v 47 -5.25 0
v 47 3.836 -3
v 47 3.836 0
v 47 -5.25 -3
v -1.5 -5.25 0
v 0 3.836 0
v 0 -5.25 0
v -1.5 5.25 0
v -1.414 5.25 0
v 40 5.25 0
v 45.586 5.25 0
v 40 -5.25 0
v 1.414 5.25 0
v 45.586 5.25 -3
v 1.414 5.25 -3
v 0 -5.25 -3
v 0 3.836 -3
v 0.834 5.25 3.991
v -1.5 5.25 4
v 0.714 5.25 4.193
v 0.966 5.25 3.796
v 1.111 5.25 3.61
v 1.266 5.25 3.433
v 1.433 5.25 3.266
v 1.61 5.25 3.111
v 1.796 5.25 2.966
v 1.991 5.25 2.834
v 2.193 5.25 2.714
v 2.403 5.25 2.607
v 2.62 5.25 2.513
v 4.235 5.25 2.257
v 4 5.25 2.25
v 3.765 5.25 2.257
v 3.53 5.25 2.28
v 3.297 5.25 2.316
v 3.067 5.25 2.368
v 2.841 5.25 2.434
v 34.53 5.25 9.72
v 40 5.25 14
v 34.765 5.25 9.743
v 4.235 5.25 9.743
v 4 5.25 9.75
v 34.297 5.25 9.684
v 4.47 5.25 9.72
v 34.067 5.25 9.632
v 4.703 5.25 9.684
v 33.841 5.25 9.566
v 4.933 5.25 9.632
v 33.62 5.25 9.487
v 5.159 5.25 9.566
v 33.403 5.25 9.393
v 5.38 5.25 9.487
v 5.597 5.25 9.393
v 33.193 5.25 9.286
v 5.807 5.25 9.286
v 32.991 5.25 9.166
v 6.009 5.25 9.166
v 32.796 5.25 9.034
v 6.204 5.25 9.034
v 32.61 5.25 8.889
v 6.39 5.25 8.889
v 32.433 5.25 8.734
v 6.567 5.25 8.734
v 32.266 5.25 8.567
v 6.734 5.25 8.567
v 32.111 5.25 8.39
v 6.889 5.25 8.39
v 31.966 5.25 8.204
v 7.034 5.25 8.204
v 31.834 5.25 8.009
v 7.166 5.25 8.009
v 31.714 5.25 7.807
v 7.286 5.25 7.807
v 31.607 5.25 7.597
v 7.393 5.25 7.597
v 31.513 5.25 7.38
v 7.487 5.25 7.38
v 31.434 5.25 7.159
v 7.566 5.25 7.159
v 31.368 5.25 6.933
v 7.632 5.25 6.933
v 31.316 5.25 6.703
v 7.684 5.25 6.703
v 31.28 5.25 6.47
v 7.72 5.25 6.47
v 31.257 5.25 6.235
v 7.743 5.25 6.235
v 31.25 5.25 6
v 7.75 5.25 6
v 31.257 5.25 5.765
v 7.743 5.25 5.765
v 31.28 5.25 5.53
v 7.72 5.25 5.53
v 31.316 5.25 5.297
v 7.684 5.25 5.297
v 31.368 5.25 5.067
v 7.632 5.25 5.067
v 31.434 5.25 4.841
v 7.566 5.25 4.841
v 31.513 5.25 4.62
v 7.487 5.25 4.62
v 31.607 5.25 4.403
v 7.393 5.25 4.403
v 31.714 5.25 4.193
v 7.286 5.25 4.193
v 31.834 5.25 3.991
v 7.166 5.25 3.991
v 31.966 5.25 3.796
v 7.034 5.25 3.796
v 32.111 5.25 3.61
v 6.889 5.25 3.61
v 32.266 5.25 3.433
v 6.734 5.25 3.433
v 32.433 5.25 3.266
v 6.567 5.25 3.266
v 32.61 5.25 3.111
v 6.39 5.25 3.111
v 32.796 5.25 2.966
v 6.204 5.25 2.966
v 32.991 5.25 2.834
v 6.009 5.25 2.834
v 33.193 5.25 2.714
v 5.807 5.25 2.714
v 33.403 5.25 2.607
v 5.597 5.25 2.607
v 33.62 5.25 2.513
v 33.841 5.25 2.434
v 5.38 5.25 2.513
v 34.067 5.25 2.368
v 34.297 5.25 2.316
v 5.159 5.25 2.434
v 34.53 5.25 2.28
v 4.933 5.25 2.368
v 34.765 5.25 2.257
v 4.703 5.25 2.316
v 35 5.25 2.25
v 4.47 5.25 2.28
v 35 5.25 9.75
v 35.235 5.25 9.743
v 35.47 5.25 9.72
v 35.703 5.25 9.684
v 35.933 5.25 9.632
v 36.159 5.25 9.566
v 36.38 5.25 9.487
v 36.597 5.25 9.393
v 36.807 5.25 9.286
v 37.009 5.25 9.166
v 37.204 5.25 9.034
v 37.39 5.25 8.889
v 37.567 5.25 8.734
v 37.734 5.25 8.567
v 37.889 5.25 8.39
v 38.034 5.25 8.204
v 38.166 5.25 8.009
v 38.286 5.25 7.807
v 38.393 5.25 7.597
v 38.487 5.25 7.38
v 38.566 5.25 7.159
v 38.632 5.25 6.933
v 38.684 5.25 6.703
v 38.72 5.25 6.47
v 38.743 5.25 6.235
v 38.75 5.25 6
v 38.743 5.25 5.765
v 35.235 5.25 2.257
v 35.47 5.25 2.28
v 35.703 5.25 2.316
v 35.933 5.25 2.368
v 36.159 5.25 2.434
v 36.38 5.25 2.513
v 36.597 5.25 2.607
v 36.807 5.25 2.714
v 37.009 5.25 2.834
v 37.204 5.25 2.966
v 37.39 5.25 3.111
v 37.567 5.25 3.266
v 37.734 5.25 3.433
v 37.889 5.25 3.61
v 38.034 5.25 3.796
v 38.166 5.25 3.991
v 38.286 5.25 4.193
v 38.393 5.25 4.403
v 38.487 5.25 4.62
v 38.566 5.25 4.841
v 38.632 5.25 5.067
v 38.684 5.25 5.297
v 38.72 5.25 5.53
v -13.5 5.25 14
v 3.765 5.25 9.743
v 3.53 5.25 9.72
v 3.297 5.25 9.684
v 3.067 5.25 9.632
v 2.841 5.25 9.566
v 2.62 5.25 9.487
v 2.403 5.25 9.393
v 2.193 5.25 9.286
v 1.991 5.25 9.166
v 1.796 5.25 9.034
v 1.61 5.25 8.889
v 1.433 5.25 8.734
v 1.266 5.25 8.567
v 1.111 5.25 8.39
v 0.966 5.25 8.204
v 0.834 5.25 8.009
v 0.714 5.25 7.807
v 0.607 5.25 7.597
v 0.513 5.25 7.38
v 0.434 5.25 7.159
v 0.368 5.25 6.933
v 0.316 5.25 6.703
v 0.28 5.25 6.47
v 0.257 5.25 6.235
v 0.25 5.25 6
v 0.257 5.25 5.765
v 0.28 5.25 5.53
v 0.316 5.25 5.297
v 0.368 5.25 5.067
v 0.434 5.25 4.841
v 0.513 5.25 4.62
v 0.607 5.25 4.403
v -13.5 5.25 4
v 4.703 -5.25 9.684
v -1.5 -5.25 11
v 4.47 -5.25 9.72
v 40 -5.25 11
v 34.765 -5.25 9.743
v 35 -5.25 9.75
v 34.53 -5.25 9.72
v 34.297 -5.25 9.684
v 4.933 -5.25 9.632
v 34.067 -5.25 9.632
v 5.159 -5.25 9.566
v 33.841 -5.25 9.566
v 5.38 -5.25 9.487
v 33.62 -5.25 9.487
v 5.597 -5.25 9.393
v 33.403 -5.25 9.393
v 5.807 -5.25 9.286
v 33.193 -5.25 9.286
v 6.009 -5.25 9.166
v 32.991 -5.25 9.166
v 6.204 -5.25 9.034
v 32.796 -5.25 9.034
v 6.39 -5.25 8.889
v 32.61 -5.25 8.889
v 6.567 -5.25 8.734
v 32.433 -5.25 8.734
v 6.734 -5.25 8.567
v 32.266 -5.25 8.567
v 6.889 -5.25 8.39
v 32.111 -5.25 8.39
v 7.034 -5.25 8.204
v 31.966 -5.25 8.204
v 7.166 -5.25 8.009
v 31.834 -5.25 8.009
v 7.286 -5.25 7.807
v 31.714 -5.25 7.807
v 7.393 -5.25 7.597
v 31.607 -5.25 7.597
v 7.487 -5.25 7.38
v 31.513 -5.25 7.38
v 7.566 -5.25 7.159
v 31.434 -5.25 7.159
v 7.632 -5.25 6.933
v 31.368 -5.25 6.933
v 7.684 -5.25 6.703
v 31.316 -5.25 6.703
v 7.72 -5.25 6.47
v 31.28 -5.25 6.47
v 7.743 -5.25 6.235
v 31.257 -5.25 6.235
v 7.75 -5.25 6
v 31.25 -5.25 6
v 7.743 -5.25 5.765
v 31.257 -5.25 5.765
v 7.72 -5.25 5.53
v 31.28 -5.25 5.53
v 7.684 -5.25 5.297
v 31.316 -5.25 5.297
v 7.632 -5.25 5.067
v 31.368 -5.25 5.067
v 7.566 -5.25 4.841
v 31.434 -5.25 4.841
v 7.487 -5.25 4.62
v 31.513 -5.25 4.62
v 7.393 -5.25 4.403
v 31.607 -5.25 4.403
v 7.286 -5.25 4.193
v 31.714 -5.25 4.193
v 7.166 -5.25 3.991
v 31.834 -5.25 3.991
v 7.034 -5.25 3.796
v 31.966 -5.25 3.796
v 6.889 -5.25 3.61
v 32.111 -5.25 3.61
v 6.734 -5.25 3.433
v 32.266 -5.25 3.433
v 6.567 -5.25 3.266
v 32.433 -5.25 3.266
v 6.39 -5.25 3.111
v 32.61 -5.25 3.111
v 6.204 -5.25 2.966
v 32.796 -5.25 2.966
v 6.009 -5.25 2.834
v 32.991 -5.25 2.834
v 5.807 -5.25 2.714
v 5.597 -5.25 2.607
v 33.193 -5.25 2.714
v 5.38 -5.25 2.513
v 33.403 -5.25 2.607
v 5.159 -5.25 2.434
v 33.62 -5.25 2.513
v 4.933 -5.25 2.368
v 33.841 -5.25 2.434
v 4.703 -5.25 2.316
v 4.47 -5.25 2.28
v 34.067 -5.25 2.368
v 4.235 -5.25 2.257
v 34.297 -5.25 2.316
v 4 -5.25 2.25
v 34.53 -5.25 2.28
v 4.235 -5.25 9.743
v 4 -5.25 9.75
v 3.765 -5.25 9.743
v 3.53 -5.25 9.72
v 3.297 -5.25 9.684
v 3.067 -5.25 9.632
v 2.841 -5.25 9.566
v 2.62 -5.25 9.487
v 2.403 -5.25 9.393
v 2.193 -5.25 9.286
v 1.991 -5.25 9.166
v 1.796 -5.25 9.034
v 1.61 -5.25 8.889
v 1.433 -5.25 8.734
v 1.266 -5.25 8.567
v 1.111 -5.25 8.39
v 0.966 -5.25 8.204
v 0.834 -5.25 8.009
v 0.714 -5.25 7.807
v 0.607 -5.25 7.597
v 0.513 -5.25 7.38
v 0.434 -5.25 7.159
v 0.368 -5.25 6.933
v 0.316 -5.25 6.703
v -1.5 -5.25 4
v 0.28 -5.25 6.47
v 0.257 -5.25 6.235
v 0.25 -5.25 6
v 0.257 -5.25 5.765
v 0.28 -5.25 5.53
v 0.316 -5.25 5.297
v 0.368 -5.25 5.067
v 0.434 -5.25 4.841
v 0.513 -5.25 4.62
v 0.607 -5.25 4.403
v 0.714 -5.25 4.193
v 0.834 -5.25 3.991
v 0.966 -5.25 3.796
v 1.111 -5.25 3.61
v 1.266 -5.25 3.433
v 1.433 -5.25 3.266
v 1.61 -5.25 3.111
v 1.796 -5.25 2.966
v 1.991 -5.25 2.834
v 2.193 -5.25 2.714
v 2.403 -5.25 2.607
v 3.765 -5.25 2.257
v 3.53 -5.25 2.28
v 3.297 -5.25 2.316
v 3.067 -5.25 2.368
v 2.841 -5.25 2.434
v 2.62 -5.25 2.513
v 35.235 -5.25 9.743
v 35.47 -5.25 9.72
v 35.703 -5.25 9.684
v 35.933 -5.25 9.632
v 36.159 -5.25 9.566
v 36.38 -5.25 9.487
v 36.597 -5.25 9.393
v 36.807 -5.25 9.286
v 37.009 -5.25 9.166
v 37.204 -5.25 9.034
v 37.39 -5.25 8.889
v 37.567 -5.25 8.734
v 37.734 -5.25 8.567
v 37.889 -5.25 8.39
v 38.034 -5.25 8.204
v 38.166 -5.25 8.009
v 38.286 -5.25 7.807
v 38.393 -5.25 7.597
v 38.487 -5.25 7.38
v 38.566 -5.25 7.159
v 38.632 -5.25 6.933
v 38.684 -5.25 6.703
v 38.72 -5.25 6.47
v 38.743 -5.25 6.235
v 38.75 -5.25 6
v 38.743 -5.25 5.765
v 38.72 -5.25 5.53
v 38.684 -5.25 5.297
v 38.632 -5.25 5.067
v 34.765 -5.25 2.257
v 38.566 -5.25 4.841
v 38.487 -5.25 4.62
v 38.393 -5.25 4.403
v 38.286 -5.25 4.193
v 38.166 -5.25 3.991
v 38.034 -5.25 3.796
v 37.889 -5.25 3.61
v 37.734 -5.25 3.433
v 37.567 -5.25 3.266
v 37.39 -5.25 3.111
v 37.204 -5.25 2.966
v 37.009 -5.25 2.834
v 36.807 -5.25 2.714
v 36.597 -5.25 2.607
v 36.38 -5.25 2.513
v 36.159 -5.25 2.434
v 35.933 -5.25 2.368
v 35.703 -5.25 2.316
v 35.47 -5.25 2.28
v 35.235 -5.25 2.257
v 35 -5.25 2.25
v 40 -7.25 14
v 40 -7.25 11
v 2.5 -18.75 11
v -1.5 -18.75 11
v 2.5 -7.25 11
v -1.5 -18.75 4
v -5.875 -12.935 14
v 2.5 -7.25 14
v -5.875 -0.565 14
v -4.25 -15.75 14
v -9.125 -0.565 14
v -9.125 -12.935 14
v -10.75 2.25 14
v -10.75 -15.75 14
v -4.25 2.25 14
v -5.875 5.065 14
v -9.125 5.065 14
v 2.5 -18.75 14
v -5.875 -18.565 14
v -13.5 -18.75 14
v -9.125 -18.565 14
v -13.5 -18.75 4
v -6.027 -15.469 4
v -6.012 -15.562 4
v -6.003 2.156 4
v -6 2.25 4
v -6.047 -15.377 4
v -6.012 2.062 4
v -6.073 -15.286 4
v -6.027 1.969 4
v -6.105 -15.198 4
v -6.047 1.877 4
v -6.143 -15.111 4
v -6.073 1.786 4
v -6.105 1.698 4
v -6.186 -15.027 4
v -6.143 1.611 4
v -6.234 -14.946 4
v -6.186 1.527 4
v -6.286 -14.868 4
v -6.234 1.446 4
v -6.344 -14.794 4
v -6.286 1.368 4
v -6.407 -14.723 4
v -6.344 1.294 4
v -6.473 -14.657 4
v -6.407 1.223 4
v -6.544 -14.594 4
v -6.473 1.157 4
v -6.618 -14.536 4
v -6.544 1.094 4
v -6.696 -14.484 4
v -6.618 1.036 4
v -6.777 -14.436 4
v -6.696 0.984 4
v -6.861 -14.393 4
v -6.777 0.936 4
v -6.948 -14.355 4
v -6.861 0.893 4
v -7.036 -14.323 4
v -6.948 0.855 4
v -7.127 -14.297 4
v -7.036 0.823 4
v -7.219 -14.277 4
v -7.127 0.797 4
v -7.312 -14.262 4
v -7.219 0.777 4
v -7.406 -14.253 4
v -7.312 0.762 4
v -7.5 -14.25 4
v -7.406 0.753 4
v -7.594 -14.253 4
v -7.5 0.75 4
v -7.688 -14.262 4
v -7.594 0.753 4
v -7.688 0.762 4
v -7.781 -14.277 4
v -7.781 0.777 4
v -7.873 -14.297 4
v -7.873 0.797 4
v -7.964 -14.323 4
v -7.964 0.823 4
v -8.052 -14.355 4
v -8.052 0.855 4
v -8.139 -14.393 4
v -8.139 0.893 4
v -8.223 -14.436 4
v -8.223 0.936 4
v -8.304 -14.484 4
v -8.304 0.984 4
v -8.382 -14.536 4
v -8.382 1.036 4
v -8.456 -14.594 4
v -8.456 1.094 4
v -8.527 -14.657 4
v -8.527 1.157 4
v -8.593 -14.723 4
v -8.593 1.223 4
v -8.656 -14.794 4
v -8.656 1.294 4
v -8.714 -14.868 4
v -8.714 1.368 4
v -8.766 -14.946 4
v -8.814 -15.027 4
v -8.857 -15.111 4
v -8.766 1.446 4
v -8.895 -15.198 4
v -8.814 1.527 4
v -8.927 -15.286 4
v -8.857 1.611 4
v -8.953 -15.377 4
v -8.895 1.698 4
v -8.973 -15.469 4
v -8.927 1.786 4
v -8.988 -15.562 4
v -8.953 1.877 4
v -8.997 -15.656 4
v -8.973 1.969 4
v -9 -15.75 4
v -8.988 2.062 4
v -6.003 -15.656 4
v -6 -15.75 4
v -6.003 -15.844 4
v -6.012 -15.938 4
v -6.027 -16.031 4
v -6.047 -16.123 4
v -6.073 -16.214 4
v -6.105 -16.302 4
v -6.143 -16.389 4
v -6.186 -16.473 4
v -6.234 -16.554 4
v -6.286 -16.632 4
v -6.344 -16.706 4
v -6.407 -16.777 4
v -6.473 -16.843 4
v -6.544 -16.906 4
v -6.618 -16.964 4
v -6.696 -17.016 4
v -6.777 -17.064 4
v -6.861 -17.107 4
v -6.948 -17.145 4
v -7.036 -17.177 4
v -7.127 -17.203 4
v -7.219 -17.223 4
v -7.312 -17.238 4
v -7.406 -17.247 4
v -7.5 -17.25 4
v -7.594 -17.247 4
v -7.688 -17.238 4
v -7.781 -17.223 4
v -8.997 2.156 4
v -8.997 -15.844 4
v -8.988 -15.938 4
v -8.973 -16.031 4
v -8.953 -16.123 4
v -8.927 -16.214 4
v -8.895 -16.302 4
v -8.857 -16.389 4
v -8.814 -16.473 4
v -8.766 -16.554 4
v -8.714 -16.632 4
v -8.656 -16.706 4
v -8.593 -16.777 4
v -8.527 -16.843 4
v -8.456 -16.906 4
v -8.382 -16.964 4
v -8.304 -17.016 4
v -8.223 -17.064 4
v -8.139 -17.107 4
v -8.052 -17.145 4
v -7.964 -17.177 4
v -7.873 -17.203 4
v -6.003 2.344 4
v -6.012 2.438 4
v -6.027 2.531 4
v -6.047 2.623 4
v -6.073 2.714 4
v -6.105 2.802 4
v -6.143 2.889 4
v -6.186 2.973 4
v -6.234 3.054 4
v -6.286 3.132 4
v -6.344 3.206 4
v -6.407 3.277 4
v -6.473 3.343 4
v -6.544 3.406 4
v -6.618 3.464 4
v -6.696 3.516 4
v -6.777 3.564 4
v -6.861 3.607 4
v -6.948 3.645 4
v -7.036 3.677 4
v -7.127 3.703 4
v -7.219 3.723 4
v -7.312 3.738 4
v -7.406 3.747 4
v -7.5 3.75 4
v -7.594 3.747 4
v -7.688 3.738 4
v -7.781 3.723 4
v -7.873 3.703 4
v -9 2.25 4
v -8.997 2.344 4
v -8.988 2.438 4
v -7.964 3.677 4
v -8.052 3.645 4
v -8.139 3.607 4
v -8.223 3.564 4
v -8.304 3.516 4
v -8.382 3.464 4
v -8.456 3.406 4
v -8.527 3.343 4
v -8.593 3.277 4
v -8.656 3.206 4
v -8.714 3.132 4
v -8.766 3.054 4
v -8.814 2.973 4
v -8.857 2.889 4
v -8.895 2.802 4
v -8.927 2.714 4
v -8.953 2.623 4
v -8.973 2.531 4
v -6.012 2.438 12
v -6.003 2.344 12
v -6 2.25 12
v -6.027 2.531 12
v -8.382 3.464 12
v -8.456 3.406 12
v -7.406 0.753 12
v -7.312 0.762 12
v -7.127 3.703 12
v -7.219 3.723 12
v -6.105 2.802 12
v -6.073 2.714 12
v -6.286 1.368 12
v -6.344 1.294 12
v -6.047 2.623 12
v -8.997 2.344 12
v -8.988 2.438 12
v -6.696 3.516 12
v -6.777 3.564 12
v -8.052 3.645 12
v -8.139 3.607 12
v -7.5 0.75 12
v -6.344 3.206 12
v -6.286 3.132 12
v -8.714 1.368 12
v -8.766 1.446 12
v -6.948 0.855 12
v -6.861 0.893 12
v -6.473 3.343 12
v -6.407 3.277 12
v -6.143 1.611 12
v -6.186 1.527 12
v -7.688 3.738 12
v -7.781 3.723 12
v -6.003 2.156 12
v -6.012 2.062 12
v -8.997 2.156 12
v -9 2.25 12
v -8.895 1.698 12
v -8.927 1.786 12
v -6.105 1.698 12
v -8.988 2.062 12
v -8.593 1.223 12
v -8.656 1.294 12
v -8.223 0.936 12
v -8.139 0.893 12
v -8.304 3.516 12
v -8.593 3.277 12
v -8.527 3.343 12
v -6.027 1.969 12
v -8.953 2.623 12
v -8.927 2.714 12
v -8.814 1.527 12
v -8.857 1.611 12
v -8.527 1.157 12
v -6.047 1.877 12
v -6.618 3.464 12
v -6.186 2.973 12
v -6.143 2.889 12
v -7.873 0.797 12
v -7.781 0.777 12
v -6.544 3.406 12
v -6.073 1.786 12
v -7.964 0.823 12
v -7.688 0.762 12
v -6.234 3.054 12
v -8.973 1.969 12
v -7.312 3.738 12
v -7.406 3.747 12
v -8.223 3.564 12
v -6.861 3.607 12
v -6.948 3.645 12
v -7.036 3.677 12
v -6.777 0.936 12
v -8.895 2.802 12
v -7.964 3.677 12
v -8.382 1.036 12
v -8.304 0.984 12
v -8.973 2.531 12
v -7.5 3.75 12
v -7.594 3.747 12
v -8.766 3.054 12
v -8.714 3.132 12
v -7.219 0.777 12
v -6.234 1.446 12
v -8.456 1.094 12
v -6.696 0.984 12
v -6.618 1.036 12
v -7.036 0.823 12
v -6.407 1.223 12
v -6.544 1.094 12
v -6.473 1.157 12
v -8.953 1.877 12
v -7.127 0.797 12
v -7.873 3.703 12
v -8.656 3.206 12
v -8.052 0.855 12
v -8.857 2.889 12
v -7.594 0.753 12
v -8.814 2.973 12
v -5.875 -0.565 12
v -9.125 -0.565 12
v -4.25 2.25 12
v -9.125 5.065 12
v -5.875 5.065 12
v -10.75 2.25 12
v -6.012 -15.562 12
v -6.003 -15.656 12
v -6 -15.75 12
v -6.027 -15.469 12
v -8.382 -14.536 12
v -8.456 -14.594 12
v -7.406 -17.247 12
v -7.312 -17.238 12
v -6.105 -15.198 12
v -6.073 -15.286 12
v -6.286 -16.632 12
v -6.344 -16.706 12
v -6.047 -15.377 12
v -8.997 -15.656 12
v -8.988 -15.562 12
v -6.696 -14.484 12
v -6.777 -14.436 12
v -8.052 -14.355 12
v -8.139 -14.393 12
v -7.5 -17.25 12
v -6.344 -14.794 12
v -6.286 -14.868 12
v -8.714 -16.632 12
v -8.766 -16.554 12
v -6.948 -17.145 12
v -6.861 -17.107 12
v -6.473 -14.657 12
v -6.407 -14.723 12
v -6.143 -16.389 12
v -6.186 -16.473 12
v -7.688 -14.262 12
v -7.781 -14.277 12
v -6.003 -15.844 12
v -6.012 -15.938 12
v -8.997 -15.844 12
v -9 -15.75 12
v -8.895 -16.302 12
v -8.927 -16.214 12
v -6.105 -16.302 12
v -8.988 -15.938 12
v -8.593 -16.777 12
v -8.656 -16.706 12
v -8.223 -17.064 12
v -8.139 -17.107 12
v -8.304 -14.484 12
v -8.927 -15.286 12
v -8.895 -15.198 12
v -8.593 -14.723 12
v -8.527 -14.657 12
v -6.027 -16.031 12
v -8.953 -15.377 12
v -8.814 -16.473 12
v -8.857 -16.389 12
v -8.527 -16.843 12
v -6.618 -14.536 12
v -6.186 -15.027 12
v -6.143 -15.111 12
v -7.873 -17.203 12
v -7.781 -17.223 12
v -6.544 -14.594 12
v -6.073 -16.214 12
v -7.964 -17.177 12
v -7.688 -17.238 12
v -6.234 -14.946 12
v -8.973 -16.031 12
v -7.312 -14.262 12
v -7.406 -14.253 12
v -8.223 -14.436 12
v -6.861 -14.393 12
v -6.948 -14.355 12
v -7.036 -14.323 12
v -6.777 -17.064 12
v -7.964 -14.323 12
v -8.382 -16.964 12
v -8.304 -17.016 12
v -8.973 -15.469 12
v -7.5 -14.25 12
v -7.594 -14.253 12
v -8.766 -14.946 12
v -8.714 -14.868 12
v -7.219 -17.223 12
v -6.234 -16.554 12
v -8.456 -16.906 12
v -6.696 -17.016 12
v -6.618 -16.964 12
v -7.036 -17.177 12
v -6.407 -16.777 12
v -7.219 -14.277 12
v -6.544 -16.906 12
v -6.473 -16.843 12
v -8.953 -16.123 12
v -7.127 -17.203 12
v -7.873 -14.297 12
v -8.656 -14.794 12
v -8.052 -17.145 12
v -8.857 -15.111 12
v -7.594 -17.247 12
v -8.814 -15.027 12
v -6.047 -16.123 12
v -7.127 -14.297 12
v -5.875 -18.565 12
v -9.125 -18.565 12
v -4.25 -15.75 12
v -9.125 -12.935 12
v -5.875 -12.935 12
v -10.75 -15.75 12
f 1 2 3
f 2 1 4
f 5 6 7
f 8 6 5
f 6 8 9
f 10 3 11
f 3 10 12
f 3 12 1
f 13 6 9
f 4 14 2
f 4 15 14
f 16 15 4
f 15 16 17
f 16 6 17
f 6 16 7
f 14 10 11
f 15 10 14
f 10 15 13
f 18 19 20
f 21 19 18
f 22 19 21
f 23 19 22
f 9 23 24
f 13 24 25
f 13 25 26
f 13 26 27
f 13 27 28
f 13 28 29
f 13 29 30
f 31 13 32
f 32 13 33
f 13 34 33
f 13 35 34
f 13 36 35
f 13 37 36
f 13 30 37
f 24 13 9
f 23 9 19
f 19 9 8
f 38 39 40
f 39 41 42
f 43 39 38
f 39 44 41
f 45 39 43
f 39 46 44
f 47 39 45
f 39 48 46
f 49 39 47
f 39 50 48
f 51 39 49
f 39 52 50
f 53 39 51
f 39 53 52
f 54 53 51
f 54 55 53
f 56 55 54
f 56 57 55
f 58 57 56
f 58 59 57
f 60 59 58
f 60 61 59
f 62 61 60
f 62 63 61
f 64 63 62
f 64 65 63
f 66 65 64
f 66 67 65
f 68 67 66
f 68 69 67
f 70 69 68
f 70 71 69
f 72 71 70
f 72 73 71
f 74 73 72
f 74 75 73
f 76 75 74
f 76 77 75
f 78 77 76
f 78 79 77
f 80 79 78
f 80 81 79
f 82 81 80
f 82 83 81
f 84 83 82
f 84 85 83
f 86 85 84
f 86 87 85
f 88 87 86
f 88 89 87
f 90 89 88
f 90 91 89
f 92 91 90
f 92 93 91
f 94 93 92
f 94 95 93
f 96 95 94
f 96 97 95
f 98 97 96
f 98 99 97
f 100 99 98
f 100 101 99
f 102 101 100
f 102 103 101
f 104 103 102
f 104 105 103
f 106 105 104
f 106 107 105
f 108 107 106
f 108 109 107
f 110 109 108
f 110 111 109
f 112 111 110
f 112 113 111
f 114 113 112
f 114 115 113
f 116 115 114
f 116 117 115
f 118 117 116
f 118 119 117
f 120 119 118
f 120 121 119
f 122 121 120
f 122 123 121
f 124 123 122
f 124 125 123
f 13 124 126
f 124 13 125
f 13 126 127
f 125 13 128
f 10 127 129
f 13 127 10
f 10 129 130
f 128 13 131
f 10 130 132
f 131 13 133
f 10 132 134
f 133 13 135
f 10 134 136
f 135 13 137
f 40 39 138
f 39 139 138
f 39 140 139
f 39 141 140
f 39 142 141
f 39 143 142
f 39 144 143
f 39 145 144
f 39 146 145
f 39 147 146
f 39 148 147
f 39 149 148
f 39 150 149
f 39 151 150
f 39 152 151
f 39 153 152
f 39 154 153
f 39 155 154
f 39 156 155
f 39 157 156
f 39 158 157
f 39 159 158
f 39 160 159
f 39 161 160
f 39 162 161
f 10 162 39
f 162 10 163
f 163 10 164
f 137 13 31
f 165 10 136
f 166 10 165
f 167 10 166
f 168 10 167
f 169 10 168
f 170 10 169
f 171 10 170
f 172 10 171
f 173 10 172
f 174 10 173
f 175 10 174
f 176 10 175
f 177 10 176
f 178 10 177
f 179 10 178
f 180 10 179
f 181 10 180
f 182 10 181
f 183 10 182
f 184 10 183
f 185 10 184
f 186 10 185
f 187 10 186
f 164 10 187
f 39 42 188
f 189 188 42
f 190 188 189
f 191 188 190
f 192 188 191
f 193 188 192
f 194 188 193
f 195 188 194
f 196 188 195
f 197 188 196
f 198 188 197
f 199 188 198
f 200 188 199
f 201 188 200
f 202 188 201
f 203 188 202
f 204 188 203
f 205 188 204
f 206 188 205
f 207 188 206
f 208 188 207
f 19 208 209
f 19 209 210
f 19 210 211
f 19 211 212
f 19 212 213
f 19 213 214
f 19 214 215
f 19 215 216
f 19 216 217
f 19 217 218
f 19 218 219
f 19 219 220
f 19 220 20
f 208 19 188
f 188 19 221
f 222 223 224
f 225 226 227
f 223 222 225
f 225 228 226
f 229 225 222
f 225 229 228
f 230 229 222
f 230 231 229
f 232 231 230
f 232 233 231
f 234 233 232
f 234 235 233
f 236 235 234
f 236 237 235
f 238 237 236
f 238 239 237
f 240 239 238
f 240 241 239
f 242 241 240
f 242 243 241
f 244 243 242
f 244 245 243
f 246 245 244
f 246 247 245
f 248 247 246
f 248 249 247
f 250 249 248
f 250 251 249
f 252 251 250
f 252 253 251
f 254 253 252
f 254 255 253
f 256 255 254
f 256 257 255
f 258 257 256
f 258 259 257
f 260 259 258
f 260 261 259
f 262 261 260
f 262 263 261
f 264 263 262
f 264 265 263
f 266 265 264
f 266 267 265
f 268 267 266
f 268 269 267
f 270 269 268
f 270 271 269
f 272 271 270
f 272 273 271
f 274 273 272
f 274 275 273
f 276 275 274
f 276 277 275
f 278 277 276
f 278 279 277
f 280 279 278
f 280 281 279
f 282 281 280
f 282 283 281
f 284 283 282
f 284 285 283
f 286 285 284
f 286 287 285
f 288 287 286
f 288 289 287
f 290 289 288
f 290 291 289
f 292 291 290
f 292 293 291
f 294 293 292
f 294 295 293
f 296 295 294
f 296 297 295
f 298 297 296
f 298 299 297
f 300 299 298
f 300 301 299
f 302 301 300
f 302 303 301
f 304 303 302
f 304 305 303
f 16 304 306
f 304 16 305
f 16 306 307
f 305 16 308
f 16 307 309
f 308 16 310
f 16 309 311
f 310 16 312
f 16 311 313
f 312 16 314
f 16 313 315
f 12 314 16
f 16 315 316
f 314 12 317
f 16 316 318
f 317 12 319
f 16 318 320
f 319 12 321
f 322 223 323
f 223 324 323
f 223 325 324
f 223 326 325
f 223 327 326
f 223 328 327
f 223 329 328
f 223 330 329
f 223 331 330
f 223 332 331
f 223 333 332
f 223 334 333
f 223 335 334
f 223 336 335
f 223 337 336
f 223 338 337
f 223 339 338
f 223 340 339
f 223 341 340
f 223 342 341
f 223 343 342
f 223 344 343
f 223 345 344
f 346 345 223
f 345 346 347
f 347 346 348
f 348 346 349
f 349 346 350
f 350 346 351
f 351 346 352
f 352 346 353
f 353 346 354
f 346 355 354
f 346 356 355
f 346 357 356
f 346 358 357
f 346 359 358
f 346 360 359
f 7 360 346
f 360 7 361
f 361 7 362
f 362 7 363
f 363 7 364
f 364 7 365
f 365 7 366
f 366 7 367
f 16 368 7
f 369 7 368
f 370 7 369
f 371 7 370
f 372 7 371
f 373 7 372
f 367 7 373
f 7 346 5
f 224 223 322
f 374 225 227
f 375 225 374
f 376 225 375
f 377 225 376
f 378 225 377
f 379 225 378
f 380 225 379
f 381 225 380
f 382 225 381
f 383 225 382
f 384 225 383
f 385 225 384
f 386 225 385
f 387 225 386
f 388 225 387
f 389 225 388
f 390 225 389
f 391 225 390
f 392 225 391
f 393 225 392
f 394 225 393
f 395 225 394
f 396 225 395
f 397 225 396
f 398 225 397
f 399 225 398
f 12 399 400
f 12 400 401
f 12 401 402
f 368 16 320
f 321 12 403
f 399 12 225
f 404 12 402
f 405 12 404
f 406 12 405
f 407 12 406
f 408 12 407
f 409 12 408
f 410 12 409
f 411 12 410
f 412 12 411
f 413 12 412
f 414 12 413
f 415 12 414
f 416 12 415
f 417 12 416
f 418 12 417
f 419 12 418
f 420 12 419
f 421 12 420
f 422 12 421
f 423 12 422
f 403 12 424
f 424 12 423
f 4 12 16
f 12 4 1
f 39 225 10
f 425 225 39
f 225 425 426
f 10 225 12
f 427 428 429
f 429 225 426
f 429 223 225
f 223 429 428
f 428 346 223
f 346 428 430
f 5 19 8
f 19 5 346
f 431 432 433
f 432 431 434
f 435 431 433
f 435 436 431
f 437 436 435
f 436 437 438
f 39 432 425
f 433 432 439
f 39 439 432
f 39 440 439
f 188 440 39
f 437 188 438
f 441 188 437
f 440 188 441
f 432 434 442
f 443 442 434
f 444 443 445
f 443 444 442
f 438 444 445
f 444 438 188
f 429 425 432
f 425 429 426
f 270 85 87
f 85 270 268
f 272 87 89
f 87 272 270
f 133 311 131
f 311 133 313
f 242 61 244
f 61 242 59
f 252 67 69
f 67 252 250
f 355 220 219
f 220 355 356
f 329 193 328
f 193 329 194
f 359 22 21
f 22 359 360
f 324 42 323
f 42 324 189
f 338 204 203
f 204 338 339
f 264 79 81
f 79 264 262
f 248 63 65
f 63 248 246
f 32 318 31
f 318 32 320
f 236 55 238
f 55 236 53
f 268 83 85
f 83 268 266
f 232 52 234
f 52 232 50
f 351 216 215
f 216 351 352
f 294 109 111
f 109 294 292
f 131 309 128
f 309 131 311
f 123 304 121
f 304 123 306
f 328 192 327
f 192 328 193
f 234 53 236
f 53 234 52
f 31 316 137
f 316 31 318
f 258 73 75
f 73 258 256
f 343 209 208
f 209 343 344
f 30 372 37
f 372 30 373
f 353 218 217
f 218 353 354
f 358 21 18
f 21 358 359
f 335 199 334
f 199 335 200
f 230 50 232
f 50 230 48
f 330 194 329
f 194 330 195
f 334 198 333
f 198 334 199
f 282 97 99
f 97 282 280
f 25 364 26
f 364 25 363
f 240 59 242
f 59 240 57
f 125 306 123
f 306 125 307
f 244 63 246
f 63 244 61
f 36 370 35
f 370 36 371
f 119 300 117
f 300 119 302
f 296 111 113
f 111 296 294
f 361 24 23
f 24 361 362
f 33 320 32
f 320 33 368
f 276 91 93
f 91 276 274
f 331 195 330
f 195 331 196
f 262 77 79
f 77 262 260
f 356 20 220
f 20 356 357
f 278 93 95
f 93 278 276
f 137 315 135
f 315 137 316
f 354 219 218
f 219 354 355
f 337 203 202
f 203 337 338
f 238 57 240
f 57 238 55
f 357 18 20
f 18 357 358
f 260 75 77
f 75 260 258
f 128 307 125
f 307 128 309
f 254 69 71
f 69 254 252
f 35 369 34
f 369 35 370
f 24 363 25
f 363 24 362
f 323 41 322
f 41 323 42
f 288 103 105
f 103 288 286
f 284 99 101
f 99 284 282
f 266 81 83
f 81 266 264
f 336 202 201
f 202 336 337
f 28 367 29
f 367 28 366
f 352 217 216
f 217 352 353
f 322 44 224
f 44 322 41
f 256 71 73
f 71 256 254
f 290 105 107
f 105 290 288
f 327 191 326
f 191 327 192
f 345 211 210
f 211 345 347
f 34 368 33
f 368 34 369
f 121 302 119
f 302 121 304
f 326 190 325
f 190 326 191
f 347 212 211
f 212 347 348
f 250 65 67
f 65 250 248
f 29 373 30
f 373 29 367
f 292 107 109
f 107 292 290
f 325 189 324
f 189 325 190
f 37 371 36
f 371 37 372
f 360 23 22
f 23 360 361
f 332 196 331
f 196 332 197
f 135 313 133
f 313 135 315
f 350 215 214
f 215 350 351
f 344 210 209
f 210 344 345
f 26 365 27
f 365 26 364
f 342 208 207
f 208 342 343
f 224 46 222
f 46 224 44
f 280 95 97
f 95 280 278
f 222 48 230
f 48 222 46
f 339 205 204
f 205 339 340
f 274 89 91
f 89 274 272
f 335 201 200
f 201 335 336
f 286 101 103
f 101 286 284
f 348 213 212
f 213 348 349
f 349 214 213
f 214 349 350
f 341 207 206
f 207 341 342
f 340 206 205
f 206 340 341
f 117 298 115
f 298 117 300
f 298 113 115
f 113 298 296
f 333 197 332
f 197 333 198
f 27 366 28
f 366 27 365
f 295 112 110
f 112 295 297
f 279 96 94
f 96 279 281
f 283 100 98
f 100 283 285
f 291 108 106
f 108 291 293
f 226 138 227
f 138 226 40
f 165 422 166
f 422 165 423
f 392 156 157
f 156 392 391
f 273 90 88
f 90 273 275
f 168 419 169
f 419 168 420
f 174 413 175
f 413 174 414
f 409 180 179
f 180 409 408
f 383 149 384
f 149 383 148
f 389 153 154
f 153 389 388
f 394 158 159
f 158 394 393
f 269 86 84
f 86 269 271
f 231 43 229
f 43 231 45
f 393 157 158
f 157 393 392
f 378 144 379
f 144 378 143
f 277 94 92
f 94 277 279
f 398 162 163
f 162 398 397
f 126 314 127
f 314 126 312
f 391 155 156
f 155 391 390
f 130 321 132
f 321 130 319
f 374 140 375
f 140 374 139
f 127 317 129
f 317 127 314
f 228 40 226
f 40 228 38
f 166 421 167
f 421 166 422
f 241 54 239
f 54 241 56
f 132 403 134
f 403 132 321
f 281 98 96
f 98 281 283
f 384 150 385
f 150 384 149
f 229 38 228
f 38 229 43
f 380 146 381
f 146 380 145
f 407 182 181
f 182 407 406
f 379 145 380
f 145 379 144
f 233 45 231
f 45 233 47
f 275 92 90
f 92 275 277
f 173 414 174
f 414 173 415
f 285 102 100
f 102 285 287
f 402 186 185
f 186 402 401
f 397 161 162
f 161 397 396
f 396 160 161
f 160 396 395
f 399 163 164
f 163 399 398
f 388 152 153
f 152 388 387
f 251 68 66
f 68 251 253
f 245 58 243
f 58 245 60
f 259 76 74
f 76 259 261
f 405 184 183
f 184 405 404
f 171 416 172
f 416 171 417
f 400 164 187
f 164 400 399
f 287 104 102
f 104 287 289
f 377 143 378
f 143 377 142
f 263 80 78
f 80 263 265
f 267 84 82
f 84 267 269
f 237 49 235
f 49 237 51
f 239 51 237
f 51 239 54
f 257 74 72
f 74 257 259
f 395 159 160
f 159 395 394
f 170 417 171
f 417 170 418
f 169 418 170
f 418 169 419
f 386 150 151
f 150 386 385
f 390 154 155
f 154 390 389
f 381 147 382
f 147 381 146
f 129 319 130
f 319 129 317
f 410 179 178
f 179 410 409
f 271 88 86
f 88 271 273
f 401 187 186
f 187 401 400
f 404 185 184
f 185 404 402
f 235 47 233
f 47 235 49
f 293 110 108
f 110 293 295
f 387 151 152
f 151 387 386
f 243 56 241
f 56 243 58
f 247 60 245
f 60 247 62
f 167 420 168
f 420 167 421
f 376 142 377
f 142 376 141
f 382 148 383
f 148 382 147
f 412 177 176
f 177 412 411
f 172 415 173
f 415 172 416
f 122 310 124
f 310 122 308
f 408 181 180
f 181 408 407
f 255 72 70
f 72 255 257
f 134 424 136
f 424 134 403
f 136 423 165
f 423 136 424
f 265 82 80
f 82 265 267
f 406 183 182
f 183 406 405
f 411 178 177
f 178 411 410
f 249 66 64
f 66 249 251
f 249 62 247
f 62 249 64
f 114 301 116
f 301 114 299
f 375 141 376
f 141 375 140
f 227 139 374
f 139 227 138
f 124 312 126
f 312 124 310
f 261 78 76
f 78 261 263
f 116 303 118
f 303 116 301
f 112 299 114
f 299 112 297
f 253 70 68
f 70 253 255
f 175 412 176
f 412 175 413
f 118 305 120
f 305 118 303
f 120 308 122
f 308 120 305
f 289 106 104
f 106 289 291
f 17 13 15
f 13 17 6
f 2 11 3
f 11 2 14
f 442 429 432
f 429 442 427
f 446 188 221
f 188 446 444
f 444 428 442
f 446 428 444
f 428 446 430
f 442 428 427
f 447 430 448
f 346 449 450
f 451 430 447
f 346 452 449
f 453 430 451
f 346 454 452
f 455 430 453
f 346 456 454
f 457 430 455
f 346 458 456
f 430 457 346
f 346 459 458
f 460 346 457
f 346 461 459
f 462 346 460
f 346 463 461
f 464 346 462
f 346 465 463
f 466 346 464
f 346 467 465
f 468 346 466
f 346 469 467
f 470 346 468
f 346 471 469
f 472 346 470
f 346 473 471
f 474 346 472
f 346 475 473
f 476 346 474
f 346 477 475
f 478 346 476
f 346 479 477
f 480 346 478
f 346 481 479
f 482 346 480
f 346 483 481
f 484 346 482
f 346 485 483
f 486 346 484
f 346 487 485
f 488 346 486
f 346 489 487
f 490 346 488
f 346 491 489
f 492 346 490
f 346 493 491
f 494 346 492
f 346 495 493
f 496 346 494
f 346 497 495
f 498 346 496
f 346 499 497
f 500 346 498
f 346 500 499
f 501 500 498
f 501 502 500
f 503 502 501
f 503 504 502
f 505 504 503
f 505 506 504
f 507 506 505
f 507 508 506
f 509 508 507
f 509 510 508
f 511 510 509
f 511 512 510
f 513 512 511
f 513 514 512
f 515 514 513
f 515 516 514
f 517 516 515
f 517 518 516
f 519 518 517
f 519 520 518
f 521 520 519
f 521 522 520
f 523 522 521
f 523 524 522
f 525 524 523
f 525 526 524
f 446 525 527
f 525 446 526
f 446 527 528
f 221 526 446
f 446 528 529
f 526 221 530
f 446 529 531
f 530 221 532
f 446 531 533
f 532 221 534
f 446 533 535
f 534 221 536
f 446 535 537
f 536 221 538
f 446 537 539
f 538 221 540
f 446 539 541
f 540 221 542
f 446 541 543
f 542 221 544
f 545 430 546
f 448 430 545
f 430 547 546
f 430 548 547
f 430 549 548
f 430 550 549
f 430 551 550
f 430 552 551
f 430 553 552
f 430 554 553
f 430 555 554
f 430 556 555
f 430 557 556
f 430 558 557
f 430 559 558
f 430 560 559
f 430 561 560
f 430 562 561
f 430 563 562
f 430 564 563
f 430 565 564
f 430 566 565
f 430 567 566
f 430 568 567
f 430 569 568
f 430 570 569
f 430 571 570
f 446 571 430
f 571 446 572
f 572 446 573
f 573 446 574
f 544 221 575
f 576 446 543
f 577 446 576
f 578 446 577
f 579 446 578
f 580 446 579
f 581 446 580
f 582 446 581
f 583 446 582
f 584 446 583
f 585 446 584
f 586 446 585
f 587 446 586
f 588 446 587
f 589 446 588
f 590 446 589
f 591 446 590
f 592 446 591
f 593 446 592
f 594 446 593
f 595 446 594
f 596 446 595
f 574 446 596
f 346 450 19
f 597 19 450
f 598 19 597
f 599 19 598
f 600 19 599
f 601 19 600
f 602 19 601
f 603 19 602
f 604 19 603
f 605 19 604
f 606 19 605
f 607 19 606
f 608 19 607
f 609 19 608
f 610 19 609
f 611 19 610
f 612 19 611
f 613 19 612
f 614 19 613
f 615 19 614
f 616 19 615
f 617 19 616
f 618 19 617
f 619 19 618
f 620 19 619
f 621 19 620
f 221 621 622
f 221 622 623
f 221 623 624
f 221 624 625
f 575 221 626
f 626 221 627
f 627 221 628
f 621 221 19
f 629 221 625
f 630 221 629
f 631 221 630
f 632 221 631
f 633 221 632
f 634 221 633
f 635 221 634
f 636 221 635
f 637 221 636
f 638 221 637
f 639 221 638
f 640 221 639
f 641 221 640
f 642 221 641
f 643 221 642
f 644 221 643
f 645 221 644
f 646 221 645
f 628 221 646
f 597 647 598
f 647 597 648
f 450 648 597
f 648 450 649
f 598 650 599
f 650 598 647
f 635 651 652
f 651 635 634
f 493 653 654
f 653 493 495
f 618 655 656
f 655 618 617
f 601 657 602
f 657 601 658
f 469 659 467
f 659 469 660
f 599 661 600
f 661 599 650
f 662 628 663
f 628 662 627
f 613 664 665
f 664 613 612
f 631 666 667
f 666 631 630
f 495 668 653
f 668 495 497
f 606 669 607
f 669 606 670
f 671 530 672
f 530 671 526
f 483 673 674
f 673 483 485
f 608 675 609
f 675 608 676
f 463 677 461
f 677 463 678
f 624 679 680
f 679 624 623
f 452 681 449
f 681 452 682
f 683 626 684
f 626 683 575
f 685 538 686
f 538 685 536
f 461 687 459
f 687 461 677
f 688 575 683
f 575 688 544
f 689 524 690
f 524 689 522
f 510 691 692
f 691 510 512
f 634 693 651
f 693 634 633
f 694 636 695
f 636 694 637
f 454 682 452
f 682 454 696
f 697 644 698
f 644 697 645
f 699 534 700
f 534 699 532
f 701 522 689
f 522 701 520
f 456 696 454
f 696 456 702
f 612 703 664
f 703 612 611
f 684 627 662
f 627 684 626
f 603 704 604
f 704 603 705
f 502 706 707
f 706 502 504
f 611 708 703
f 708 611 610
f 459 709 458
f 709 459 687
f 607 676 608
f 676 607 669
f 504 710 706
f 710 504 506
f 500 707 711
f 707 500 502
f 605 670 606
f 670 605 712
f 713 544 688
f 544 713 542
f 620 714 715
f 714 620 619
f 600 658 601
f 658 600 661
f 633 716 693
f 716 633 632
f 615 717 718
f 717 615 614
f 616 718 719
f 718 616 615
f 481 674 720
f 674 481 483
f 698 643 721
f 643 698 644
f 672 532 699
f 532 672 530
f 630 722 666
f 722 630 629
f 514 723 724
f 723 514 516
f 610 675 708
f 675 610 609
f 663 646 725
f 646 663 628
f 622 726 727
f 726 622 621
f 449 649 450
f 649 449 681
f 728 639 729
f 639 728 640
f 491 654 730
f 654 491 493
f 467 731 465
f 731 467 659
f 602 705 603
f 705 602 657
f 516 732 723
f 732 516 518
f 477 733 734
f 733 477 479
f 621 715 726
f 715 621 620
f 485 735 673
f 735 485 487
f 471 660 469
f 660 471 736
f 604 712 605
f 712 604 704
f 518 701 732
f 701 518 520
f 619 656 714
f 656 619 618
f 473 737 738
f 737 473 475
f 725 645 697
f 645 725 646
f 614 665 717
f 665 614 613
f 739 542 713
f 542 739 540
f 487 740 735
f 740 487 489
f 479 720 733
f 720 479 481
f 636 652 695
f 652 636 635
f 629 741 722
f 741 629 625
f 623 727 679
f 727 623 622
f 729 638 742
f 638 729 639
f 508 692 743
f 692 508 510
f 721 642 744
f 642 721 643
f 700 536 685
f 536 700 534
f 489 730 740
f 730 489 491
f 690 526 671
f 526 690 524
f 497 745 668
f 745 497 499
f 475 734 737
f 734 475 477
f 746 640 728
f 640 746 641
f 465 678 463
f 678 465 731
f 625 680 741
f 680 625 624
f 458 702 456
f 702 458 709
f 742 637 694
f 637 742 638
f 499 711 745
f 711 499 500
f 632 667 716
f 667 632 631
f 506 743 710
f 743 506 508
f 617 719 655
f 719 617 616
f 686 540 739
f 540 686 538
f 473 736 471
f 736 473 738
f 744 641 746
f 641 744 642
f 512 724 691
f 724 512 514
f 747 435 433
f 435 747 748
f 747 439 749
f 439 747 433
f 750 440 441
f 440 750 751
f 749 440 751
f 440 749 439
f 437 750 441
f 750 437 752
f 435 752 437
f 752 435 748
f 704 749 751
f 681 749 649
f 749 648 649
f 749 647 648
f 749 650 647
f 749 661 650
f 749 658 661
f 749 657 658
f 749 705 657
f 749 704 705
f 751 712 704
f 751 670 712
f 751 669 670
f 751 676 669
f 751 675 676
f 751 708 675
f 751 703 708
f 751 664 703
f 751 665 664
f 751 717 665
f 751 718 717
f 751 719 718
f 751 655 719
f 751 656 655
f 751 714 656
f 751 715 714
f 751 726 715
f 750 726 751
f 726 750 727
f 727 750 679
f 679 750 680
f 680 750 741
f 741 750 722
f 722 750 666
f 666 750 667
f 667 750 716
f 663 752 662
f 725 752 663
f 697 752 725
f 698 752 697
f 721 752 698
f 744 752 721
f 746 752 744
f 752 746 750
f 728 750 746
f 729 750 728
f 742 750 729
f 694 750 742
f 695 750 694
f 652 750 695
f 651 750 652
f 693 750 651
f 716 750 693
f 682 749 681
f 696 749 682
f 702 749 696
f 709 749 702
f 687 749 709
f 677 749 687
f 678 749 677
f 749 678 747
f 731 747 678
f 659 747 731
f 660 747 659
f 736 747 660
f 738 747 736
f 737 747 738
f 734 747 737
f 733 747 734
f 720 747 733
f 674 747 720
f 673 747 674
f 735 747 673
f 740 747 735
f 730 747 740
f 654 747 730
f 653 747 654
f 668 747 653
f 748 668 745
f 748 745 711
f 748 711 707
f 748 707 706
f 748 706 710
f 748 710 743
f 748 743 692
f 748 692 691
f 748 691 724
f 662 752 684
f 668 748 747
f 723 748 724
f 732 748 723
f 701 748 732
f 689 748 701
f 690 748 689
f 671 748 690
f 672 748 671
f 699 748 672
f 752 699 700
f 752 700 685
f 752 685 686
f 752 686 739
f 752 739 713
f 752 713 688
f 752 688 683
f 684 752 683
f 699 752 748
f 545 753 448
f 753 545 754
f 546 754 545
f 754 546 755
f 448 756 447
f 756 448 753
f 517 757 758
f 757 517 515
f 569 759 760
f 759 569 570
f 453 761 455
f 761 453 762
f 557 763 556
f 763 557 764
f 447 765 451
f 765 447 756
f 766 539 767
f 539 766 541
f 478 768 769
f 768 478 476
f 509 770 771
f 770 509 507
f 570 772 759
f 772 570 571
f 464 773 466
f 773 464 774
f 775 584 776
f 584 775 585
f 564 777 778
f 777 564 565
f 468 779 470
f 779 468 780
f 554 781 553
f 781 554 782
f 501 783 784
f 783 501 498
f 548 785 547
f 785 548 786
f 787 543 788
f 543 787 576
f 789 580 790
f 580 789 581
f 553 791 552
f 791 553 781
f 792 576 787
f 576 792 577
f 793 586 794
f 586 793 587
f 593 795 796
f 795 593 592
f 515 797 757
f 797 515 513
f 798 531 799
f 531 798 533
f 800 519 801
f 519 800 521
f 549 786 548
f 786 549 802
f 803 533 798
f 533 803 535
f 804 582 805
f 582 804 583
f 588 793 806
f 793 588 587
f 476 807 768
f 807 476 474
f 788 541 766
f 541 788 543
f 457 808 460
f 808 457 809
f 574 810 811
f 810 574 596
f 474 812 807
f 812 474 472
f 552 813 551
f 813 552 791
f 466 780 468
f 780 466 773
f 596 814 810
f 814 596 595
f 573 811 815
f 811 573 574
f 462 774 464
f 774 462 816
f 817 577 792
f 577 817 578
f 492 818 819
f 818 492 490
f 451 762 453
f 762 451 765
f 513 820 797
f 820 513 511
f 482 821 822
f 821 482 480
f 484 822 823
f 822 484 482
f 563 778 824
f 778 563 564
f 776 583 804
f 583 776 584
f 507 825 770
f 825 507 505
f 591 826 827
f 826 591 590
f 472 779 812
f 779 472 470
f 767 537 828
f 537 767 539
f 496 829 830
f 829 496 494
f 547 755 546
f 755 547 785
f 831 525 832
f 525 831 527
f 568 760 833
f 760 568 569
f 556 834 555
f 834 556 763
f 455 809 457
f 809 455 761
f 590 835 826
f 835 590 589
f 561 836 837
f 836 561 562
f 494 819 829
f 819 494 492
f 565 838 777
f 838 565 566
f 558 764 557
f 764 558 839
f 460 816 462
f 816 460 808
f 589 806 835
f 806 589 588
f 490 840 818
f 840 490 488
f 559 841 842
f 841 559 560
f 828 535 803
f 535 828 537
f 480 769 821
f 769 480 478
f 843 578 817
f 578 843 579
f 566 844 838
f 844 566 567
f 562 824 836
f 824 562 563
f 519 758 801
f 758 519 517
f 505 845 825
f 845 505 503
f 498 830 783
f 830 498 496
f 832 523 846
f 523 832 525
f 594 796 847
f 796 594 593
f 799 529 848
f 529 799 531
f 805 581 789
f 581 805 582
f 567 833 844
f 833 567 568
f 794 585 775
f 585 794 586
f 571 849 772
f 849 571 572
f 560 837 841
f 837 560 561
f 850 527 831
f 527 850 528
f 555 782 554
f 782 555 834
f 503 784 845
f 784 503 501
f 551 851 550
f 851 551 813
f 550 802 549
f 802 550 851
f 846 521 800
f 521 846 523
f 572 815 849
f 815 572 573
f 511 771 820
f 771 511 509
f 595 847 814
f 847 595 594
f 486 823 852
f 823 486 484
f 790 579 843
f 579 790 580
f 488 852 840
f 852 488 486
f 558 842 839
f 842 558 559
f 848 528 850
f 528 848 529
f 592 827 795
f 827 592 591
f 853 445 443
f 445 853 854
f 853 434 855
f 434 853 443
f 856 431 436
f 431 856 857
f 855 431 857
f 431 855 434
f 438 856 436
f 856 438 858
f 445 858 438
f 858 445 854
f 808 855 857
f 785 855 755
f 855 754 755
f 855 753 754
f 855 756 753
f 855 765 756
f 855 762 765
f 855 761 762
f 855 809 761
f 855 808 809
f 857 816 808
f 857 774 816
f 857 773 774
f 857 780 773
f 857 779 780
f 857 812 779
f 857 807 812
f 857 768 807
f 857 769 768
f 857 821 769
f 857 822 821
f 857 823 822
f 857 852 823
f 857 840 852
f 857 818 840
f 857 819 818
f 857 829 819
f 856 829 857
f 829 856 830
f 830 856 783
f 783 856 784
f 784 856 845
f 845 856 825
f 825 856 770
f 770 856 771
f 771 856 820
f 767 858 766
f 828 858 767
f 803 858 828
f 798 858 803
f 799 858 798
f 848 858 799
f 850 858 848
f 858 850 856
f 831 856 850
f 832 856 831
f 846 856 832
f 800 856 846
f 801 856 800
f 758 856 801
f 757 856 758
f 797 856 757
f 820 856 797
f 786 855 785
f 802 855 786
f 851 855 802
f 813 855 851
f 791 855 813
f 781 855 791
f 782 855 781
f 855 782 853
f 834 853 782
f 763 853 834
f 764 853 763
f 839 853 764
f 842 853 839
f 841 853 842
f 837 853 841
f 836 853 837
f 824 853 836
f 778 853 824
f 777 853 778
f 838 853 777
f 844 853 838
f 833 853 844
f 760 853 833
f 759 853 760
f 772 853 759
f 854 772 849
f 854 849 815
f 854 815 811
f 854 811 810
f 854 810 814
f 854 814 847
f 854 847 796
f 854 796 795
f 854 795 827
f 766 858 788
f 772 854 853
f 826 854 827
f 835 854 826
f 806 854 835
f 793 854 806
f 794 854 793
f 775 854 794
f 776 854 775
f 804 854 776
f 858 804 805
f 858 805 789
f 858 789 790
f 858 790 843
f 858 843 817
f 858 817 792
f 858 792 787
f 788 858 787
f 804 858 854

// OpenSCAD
$fn = 100;

fan_distance = 32;
fan_width = 40;

base_width = 47;
base_height = 3;

spacer_diameter = 7.5;
spacer_height = 10;

depth = 10.5;
h = 10;

difference() {
    union() {
        translate([0, -depth * 0.5, -base_height]) cube([base_width, depth, base_height]);
        translate([-1.5, -depth * 0.5, 0]) cube([fan_width + 1.5, depth, spacer_height + 1]);
        translate([-1.5, -depth * 0.5 - 2, spacer_height + 1]) cube([fan_width + 1.5, depth + 2, 3]);
    }
    
    translate([4, 0, 6]) rotate([90, 0, 0]) cylinder(h = depth, d = spacer_diameter, center = true);
    translate([fan_width - 5, 0, 6]) rotate([90, 0, 0]) cylinder(h = depth, d = spacer_diameter, center = true);

    translate([0, depth * 0.5, 0]) rotate([0, 0, 45]) translate([0, 0, -1.5]) cube([2, 2, 3], center = true);
    translate([base_width, depth * 0.5, 0]) rotate([0, 0, 45]) translate([0, 0, -1.5]) cube([2, 2, 3], center = true);
}

translate([-12 * 0.5 - 1.5, depth * 0.5 - 24, 11]) difference() {
    union() {
        translate([-6, 0, 0]) cube([16, 24, 3]);
        translate([-6, 0, -7])cube([12, 24, 7]);
    }
    translate([0, 24 * 0.5, 0]) {
        translate([0, 9, 0]) {
            translate([0, 0, -7]) cylinder(h = 7 + 2, d = 3);
            translate([0, 0, 1]) cylinder(h = 2, d = 6.5, $fn = 6);
        }
        translate([0, -9, 0]) {
            translate([0, 0, -7]) cylinder(h = 7 + 2, d = 3);
            translate([0, 0, 1]) cylinder(h = 2, d = 6.5, $fn = 6);
        }
    }
}
